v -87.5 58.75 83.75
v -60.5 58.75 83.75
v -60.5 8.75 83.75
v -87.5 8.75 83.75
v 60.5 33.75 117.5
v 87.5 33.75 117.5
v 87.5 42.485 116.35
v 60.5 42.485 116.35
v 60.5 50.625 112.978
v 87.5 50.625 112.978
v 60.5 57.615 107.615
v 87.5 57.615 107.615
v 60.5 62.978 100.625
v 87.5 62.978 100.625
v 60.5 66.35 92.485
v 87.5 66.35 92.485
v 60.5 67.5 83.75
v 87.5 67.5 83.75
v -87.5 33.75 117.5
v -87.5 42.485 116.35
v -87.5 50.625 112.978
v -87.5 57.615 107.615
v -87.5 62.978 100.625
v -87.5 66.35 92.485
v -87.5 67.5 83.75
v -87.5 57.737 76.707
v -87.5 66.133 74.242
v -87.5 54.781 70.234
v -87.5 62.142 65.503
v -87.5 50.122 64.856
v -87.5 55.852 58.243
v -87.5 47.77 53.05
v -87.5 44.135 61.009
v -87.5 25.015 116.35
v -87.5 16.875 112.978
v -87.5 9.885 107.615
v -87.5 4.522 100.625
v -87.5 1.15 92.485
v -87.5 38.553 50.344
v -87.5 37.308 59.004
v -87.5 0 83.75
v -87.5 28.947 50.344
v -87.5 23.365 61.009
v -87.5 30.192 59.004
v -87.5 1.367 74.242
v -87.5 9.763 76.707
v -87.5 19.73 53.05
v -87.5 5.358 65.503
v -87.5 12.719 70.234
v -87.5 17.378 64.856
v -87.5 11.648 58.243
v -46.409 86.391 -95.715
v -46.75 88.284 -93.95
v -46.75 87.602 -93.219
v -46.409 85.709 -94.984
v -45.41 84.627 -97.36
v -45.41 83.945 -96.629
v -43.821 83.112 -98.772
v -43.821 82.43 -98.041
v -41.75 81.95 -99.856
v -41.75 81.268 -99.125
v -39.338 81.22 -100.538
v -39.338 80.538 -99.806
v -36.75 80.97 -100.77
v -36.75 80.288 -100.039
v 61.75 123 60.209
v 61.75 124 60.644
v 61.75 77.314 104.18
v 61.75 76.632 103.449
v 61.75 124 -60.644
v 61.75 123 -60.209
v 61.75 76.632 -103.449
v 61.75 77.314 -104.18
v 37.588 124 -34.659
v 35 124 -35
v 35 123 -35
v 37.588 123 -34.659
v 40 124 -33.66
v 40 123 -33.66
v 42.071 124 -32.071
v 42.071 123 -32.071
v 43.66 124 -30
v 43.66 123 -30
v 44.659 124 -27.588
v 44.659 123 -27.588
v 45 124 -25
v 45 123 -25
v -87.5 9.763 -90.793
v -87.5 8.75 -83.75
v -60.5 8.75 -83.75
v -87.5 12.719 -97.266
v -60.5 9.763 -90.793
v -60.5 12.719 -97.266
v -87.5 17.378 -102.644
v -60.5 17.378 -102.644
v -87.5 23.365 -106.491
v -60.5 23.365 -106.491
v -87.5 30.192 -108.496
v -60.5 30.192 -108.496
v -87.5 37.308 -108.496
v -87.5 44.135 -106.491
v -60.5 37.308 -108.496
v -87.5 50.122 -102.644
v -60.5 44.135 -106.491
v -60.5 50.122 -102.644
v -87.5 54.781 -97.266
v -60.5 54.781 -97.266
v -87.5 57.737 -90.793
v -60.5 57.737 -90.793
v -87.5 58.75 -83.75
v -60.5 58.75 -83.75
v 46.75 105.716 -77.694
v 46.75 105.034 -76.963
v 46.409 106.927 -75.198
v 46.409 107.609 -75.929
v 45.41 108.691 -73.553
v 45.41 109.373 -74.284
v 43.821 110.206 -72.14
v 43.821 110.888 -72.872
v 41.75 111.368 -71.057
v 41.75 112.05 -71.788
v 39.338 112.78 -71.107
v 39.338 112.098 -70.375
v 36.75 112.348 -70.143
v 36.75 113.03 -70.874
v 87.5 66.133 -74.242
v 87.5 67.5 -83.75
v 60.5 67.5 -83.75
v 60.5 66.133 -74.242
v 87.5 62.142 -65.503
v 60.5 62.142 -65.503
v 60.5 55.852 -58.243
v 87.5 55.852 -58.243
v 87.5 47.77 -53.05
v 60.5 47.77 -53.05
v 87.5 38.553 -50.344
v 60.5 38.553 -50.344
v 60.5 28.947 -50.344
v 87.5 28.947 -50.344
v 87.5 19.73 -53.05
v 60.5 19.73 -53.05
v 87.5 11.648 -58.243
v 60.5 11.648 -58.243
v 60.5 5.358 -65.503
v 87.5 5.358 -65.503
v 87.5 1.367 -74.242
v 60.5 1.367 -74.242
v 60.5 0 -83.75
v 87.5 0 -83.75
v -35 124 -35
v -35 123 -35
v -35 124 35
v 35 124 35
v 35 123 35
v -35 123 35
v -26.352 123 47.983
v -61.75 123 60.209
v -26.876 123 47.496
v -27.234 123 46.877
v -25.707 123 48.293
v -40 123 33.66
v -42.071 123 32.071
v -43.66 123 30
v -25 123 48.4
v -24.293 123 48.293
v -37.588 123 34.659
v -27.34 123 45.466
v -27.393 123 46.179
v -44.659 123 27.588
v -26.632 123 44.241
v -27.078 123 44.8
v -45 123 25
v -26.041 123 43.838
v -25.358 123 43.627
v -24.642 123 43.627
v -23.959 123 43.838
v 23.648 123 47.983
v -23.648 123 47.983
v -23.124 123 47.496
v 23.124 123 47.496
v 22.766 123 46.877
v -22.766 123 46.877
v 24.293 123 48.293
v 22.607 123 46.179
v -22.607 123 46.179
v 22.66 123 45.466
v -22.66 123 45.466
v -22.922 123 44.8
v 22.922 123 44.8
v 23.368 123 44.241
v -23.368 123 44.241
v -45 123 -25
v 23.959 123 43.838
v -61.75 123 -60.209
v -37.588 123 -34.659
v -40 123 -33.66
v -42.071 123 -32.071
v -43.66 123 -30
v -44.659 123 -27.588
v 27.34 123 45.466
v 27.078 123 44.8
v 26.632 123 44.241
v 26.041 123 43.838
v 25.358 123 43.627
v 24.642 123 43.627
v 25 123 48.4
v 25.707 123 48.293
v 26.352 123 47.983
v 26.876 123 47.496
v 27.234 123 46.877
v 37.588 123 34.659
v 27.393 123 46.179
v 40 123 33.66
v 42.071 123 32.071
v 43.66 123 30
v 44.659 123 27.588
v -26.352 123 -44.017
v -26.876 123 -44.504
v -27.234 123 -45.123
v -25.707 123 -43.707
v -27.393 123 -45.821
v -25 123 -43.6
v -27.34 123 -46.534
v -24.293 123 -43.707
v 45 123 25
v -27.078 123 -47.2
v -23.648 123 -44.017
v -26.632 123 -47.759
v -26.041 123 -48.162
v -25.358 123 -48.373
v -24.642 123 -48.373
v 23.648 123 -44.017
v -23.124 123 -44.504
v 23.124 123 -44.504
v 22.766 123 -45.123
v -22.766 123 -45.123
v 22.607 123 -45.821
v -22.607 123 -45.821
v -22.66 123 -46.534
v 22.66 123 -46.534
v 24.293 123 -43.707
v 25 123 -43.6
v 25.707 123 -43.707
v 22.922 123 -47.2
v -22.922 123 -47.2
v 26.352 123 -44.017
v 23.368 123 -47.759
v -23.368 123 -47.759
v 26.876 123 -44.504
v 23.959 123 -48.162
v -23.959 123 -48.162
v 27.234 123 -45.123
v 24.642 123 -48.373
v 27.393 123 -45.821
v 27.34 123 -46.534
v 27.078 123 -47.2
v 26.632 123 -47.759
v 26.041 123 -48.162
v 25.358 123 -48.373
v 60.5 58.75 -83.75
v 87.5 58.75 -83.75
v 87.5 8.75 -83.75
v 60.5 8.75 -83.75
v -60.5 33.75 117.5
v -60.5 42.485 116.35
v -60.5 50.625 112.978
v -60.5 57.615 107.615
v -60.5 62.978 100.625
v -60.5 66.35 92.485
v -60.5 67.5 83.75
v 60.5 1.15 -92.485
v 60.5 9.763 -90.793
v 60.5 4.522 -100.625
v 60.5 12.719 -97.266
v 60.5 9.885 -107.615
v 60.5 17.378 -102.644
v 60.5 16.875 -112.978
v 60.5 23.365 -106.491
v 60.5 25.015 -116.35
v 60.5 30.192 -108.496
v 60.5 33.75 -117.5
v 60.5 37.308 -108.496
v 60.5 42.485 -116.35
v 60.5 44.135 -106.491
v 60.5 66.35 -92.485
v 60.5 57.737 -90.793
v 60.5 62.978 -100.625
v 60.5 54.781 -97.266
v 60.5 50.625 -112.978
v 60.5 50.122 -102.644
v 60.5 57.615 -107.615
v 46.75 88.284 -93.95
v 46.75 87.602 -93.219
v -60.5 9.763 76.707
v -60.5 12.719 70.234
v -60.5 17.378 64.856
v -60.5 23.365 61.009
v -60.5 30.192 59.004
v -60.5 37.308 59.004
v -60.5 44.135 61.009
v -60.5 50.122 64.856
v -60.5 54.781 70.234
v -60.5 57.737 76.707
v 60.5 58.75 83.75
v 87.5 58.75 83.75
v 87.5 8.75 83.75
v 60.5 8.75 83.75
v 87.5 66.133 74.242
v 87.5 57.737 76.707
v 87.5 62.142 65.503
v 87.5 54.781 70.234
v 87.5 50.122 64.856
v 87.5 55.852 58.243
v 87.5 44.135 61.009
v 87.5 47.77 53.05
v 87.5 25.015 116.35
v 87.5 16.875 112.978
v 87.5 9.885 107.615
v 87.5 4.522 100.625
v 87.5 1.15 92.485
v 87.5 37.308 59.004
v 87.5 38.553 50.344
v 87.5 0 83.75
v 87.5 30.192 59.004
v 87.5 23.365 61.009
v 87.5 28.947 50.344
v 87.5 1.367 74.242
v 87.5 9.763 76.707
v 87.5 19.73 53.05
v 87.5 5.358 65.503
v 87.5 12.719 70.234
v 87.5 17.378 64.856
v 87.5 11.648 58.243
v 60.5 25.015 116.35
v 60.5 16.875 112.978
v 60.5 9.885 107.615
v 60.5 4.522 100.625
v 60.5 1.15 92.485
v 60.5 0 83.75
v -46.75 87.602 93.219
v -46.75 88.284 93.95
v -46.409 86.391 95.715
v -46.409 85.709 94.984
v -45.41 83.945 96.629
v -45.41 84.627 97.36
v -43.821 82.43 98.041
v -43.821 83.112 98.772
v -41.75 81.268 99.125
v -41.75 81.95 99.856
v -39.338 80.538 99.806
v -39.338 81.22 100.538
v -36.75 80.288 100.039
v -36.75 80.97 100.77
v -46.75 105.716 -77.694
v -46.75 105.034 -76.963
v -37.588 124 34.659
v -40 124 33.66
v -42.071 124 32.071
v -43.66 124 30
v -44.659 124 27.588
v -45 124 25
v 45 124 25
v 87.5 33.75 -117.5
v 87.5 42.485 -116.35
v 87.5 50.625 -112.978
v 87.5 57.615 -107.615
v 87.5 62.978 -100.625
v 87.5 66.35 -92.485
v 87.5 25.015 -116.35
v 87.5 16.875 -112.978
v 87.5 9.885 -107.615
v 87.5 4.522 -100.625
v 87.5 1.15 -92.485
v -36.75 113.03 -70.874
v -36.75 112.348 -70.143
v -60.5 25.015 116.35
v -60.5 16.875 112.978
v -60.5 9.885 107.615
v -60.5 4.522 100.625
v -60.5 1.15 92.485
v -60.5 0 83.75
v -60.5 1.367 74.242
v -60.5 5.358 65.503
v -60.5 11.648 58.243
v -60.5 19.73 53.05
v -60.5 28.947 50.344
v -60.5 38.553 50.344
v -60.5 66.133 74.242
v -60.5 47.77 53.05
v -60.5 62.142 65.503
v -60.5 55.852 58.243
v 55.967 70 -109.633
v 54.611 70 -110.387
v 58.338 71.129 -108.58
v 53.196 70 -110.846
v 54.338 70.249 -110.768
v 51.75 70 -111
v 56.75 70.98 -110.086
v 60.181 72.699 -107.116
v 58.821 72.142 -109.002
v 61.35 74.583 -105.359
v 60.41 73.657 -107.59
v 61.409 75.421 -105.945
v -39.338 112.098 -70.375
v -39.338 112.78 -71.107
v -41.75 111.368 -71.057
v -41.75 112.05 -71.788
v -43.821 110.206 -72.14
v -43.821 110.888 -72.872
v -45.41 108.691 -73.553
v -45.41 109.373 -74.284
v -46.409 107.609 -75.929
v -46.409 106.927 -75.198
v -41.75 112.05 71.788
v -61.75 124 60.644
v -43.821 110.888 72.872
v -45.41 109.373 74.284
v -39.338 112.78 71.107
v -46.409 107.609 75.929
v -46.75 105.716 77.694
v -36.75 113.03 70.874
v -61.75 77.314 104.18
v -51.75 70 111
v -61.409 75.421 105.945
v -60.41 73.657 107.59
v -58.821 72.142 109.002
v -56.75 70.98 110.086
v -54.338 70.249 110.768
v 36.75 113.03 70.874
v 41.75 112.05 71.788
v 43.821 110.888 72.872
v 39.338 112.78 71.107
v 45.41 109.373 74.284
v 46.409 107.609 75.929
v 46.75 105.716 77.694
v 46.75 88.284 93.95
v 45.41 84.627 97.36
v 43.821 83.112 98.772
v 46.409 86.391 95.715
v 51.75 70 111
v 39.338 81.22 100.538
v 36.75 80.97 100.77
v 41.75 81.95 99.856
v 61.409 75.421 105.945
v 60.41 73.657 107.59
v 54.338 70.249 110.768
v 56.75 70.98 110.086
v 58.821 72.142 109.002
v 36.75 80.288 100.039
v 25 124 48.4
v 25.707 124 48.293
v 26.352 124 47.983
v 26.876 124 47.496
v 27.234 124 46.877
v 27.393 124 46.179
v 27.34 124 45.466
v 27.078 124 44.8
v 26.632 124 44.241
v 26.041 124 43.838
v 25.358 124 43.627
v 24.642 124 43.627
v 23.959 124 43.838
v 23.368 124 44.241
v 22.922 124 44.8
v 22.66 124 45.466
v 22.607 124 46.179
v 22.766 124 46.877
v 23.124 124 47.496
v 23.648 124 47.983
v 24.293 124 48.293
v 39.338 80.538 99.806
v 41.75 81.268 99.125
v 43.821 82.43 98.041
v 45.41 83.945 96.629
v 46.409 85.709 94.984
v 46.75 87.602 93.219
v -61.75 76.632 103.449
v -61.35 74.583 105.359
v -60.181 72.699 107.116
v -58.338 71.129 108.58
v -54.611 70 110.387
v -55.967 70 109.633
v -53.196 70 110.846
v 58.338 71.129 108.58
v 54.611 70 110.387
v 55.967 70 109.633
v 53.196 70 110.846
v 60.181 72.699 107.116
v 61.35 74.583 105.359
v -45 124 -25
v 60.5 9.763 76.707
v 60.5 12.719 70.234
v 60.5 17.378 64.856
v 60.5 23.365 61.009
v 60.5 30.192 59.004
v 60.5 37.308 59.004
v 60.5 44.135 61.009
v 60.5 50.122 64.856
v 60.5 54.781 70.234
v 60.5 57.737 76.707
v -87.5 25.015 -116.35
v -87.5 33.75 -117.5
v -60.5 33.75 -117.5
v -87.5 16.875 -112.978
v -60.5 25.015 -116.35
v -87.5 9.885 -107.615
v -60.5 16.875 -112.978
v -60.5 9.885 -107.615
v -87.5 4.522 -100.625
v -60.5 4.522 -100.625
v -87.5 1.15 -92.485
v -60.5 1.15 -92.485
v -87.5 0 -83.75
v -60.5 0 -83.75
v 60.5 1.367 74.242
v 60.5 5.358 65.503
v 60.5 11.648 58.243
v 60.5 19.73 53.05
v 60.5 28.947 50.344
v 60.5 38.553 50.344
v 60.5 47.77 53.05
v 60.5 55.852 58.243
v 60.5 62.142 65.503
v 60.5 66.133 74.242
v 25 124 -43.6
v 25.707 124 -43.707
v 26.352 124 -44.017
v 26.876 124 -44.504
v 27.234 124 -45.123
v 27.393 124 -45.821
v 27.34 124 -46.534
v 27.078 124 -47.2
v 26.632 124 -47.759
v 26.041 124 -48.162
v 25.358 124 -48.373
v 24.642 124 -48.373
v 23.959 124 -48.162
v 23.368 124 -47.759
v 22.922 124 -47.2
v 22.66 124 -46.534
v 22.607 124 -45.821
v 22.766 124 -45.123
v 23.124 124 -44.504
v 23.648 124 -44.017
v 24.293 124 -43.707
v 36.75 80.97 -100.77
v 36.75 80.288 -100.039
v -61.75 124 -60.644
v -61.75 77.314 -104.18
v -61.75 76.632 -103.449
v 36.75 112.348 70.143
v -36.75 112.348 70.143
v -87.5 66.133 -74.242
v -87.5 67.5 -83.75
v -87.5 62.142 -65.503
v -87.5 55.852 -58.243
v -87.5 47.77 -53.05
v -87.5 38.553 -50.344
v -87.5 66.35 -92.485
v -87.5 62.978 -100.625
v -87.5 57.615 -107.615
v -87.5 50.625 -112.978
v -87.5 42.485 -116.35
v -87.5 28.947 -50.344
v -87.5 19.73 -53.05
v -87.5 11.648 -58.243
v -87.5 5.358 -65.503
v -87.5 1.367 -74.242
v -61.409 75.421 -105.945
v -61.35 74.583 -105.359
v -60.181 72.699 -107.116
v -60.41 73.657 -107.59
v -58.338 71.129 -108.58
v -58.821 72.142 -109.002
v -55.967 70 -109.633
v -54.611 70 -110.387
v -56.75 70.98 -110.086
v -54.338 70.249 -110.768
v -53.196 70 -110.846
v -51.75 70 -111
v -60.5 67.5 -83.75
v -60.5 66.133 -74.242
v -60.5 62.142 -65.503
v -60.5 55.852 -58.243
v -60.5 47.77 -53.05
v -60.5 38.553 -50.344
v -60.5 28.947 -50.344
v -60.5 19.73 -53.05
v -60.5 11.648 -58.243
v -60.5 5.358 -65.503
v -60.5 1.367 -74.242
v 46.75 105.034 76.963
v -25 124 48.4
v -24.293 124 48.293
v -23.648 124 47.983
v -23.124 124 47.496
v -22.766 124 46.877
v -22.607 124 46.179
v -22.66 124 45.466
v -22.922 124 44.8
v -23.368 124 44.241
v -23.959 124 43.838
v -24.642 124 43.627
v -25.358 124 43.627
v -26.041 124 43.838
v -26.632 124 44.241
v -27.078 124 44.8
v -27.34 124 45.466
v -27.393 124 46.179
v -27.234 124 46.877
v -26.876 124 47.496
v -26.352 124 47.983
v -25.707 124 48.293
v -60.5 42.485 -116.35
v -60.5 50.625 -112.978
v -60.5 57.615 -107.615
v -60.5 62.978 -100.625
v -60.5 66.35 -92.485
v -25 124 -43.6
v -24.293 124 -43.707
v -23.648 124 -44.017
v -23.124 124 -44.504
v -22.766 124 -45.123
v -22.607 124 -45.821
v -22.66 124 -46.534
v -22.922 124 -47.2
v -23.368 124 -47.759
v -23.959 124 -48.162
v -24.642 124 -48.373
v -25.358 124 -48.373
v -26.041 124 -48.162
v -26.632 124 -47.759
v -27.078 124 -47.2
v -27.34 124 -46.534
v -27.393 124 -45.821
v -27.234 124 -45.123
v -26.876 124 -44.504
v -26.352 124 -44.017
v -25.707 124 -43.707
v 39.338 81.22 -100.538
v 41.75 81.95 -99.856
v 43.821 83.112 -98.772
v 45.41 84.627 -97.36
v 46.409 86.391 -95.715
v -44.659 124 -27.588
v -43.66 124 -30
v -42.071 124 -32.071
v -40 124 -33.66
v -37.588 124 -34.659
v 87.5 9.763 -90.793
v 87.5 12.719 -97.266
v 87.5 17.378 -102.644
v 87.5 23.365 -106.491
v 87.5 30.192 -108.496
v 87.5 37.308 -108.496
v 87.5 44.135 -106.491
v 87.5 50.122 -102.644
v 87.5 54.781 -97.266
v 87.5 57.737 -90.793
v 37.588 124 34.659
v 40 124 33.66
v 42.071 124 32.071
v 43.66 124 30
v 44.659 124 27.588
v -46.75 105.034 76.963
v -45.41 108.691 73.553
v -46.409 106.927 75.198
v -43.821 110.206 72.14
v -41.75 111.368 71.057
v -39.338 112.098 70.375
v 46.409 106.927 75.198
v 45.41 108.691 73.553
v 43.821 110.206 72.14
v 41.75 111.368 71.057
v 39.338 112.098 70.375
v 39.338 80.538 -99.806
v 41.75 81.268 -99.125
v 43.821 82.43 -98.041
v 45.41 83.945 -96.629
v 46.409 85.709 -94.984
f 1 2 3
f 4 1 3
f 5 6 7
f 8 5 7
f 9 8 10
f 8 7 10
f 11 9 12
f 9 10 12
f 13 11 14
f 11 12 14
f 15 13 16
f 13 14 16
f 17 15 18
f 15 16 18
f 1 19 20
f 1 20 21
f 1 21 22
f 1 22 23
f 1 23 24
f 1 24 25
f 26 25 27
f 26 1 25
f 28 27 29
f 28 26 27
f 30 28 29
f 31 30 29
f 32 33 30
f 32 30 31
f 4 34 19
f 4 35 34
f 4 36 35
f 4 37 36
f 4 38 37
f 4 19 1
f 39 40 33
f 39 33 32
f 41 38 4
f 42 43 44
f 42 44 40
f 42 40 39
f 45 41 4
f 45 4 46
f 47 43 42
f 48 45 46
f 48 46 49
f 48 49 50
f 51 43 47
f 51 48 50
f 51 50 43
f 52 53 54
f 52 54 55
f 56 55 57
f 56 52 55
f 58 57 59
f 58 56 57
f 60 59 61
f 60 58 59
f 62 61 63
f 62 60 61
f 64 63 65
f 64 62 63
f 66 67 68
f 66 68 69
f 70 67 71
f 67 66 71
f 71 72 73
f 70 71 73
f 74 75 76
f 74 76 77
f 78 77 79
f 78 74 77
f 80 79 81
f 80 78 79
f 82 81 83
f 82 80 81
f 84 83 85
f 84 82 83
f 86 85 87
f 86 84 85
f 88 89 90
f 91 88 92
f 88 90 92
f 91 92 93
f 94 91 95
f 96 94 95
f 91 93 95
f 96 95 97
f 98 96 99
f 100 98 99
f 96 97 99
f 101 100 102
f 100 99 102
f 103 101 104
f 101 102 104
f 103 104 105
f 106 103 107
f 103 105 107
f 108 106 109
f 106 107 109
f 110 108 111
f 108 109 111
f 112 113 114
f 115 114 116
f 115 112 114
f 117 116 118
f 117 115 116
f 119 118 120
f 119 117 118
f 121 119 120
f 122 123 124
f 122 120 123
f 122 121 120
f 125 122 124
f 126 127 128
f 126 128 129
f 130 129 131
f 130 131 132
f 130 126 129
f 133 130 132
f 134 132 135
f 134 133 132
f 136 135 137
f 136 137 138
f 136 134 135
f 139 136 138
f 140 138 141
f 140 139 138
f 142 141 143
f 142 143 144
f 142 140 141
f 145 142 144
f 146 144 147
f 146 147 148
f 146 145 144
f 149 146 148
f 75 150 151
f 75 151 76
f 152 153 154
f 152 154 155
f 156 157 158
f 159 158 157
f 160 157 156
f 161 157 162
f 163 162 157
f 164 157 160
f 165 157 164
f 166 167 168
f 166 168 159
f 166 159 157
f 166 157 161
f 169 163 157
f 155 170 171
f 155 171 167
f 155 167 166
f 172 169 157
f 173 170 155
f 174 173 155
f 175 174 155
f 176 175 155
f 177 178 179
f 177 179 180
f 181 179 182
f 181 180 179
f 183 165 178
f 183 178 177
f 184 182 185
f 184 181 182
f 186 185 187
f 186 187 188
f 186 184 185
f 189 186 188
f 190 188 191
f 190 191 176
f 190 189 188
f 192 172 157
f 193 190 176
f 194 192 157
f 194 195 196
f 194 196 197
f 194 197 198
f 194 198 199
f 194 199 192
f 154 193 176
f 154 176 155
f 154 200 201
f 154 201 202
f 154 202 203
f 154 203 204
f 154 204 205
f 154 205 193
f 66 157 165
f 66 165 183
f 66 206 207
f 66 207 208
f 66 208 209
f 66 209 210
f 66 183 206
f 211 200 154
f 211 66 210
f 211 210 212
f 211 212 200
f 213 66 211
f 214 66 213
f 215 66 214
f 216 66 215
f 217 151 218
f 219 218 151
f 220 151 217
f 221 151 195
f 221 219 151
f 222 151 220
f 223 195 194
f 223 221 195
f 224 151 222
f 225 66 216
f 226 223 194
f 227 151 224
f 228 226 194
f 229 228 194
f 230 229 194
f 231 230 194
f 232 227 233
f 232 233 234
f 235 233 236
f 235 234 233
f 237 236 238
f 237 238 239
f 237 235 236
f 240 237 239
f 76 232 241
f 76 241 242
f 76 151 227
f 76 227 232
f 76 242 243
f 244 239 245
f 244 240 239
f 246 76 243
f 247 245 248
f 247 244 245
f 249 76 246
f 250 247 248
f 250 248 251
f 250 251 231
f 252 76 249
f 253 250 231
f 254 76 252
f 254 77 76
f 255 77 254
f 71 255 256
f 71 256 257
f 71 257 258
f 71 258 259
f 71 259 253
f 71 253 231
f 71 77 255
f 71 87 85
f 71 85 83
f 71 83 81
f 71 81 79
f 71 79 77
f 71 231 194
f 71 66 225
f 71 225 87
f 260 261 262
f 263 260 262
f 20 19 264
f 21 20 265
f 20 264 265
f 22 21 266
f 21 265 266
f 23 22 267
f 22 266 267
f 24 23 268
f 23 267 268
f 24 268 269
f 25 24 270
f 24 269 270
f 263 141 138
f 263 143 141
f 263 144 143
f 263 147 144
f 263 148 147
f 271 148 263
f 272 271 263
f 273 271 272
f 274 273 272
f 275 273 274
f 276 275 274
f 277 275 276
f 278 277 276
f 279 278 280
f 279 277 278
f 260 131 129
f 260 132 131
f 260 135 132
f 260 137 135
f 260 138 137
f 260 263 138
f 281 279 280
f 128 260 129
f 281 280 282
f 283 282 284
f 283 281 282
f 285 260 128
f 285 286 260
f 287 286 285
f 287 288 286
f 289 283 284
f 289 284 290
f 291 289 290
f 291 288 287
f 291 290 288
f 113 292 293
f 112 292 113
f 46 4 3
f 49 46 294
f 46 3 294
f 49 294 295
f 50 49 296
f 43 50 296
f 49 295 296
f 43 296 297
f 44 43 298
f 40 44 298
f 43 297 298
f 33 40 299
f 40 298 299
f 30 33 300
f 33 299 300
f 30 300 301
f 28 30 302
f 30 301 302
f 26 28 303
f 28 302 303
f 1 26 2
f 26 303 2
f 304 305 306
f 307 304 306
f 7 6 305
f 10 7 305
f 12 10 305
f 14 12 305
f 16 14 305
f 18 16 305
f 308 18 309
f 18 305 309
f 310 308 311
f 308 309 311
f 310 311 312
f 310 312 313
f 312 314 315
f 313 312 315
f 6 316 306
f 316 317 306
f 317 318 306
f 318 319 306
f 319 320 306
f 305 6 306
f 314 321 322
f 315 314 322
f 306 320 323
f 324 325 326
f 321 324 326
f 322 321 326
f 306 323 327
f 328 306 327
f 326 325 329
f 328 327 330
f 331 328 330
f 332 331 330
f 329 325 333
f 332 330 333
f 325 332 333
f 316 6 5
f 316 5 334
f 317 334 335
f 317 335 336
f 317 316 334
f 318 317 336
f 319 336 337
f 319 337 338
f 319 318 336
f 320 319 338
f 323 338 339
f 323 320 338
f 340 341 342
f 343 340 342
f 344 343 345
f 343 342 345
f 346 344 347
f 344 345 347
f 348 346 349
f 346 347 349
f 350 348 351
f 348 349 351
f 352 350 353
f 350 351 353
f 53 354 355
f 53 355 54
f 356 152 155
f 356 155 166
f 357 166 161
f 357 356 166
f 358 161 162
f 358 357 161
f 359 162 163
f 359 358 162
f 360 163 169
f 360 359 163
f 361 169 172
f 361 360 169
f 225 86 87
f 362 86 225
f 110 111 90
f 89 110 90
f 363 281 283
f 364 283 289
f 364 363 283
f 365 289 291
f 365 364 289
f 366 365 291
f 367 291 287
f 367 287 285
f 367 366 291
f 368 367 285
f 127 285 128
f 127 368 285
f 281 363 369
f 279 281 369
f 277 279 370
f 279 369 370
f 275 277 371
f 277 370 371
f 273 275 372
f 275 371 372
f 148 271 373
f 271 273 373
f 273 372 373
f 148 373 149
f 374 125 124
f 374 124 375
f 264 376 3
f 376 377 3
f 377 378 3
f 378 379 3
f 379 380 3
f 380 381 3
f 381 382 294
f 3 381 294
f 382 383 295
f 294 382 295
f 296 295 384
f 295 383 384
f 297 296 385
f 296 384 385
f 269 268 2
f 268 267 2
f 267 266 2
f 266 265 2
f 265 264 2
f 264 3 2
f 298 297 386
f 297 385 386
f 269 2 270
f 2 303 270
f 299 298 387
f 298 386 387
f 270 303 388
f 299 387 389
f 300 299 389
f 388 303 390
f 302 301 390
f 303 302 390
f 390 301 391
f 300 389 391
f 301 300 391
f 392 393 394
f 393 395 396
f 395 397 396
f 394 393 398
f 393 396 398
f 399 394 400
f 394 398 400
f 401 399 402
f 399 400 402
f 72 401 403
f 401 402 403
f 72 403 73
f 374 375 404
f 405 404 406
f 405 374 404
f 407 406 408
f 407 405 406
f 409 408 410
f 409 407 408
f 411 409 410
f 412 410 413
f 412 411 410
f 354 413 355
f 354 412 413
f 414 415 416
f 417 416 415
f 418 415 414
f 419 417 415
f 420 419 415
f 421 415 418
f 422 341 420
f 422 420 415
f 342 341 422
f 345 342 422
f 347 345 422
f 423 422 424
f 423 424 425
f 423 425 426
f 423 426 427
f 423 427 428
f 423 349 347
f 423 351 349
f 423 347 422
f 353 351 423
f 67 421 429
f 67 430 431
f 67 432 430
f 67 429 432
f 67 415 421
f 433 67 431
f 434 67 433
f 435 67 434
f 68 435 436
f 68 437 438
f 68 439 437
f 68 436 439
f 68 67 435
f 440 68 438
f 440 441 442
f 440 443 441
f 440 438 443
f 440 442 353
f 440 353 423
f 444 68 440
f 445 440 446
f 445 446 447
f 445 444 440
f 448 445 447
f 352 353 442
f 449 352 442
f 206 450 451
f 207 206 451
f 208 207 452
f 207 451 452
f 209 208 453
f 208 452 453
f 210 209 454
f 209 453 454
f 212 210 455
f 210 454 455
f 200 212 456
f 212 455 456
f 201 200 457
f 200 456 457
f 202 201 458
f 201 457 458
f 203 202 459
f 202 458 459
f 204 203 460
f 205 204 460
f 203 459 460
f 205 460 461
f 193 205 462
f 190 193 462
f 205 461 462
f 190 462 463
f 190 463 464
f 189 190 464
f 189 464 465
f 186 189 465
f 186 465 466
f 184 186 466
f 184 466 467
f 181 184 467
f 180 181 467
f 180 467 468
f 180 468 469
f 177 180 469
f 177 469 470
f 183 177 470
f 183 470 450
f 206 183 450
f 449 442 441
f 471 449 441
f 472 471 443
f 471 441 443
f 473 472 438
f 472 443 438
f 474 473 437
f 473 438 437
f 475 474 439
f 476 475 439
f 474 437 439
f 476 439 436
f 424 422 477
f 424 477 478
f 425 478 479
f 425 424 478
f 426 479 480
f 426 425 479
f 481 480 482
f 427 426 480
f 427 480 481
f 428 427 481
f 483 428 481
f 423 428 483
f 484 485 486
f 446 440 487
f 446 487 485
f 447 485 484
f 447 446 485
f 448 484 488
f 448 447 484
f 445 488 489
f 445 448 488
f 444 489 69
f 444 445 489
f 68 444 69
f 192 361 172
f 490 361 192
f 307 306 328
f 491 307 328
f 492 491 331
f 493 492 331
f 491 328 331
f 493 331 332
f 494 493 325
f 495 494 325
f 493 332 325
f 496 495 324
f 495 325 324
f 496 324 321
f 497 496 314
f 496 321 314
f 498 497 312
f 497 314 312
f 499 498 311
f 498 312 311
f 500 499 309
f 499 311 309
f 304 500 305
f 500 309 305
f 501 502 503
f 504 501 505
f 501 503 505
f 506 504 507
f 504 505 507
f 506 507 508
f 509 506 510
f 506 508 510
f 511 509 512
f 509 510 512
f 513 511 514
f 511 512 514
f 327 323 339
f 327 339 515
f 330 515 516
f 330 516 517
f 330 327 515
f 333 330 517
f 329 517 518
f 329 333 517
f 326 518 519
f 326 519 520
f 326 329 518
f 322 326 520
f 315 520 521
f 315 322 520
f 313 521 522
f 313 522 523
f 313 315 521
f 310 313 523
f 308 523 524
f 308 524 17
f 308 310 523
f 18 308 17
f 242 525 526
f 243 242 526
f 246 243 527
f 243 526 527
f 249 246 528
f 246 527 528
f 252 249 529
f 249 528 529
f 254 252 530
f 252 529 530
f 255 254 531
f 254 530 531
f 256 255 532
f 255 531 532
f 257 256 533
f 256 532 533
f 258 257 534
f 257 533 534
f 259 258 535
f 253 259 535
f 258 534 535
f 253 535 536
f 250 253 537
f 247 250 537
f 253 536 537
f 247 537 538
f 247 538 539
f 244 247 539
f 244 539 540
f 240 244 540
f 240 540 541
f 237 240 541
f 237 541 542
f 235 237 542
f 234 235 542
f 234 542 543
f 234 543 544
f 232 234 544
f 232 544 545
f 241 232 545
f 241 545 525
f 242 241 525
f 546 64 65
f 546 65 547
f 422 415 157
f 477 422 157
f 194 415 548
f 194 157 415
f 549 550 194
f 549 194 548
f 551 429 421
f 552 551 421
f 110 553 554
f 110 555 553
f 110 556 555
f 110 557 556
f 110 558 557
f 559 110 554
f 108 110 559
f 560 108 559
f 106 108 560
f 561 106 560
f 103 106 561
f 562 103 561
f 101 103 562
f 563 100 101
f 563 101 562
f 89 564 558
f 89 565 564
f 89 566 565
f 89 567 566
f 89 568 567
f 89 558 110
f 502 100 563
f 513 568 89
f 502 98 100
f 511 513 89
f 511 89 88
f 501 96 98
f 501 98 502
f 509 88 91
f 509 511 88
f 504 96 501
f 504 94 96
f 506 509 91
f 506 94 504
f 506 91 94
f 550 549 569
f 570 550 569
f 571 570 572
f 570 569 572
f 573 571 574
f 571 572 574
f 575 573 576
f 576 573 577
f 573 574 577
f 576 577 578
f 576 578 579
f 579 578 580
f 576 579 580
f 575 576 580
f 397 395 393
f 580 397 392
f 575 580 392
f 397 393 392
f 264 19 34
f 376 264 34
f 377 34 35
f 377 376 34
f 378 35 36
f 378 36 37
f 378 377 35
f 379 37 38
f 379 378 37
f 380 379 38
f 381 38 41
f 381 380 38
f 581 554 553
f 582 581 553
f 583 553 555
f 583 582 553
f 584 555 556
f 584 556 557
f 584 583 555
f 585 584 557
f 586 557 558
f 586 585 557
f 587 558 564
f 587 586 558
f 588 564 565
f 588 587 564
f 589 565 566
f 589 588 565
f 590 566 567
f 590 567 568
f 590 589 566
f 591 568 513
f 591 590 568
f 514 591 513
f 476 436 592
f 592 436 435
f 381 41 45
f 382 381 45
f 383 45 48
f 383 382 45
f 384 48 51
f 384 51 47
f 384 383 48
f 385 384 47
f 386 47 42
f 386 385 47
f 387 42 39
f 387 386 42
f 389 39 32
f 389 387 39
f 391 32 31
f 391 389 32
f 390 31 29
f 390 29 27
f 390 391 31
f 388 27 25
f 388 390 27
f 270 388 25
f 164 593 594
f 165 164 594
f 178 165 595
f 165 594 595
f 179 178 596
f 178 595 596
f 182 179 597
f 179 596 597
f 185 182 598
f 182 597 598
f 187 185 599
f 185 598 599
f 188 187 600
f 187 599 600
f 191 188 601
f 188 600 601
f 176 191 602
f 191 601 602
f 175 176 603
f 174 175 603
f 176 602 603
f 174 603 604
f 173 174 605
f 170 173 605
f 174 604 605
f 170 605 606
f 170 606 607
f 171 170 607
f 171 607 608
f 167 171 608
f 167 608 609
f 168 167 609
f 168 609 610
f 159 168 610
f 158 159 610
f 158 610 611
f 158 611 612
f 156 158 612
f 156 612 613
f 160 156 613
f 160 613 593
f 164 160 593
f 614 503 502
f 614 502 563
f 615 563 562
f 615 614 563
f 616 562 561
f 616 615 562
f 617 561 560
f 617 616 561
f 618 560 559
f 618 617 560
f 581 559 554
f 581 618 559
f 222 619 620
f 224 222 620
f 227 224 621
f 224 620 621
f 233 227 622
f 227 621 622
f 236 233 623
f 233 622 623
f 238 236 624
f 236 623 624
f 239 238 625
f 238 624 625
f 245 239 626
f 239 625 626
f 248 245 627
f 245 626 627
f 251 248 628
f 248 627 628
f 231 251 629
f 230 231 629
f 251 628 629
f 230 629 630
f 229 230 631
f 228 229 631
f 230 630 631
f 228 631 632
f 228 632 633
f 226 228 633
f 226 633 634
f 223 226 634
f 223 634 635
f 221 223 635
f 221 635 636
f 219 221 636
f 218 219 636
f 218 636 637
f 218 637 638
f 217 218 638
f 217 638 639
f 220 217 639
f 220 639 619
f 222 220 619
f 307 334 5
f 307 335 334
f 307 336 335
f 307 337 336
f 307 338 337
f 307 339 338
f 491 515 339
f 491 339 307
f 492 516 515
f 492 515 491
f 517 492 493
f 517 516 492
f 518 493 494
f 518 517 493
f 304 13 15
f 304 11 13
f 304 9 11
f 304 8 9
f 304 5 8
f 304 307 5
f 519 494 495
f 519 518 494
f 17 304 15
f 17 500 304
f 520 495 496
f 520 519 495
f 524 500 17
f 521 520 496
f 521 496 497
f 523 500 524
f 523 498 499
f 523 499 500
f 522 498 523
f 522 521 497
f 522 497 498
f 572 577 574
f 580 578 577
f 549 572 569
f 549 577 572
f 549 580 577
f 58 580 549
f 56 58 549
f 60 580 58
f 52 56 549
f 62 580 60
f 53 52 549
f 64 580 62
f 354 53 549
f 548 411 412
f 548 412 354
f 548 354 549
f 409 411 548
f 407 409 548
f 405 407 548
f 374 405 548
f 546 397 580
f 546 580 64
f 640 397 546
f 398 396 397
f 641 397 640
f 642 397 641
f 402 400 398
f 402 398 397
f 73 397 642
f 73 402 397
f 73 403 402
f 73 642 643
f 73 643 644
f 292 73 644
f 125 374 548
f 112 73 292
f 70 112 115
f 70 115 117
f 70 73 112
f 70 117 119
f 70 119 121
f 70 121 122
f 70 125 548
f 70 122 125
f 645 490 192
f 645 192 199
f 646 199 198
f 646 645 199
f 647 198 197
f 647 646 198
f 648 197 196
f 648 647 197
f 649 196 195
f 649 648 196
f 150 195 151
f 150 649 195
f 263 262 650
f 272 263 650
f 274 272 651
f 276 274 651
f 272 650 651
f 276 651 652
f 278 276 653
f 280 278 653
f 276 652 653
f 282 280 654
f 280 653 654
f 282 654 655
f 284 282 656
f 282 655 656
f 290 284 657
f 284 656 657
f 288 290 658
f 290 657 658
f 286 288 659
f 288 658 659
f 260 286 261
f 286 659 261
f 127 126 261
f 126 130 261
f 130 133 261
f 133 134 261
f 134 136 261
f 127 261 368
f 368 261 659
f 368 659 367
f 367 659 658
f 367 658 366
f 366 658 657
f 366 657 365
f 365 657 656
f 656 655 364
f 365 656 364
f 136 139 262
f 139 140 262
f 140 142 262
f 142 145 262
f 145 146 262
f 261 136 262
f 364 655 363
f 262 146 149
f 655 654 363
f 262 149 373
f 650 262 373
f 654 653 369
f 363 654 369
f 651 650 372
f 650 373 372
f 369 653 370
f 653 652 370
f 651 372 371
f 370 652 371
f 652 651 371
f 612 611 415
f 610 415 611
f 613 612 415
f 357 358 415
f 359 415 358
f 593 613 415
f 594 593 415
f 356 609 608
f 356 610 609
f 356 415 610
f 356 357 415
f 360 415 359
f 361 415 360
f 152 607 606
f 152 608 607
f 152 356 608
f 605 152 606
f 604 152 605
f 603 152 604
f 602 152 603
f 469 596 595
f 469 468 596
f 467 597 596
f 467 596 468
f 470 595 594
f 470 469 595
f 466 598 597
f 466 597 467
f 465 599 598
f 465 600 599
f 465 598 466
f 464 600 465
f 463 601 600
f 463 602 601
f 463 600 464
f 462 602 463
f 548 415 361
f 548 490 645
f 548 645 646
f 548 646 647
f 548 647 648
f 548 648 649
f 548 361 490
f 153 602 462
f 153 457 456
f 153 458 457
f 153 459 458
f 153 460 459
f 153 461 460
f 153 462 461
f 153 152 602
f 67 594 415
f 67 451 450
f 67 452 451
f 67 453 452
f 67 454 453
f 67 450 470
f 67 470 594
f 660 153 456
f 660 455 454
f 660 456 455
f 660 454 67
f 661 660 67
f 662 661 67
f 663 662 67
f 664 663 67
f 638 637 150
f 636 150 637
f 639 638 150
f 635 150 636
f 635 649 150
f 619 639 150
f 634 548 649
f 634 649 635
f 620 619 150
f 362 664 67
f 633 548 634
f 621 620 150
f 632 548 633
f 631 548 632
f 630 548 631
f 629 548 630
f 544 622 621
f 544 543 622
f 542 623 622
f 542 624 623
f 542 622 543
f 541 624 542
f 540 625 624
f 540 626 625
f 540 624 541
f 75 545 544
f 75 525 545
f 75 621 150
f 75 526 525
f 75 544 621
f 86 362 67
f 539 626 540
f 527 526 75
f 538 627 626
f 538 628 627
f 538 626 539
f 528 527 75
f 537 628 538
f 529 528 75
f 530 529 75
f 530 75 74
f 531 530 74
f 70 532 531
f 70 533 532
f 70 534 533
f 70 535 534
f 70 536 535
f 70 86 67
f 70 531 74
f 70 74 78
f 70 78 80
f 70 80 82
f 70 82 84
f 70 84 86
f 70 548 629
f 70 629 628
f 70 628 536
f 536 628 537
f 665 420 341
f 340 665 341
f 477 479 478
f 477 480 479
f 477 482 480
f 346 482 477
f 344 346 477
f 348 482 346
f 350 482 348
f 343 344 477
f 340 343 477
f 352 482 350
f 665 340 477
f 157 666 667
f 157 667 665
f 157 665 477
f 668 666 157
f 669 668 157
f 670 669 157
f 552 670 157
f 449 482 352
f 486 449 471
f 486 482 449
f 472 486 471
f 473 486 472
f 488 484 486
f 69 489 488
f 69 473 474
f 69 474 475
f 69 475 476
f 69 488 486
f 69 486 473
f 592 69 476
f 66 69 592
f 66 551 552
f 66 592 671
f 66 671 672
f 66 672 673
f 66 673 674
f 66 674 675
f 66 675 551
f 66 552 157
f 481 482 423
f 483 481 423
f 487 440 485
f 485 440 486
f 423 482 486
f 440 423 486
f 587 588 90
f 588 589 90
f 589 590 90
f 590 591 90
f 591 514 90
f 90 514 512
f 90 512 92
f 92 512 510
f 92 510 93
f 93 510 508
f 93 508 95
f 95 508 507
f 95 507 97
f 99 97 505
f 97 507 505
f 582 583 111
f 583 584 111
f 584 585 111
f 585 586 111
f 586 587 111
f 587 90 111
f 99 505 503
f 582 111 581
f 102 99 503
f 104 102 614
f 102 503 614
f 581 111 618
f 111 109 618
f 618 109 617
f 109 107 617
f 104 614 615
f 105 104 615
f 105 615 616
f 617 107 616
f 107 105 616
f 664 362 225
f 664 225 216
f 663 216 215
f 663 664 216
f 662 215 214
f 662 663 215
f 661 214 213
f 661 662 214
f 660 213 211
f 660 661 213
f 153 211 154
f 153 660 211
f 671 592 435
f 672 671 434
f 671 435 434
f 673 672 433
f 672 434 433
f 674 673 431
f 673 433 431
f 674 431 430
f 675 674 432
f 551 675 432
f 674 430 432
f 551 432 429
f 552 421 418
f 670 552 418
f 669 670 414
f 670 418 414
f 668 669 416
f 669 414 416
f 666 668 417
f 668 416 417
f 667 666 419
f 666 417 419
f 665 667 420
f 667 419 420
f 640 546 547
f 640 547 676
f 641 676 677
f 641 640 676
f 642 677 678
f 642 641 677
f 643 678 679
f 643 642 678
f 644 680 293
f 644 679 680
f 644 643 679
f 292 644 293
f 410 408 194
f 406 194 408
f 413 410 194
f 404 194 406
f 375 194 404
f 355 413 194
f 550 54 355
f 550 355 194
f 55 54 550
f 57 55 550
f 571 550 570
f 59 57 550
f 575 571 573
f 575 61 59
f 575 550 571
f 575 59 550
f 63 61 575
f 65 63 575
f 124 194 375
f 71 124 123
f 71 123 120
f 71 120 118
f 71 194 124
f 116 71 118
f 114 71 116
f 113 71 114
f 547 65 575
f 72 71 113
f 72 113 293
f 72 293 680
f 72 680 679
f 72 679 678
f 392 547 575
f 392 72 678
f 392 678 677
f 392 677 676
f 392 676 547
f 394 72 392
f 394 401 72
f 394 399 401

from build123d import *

# Parameters (mm, degrees)
ESBO_O1_W                  = 175
ESBO_O1_H                  = 235
RESSALTO_EXTRUS_O1_DEPTH   = 67.5
FILETE1_R                  = 33.75
CORTE_EXTRUS_O1_DEPTH      = 222.331199789
CORTE_EXTRUS_O2_DEPTH      = 162.303285769
CORTE_EXTRUS_O2_DEPTH_BACK = 162.303285769
ESBO_O3_W                  = 121
ESBO_O3_H                  = 67.5
ESBO_O4_W                  = 123.5
ESBO_O4_H                  = 222
RESSALTO_EXTRUS_O2_DEPTH   = 54
CORTE_EXTRUS_O3_DEPTH      = 227.843145147
ESBO_O7_R                  = 2.4
CORTE_EXTRUS_O4_DEPTH      = 192.933582262
CORTE_EXTRUS_O5_DEPTH      = 10
CORTE_EXTRUS_O6_DEPTH      = 245.555208491


with BuildPart() as part:
    # Esboço1 → Ressalto-extrusão1 (new body)
    with BuildSketch(Plane(origin=(0, 0, 0), x_dir=(1, 0, 0), z_dir=(0, 1, 0))):
        Rectangle(ESBO_O1_W, ESBO_O1_H)
    extrude(amount=RESSALTO_EXTRUS_O1_DEPTH)

    # Filete1
    filete1_edges = [part.edges().sort_by_distance(p)[0] for p in [
        (0, 0, -117.5),
        (0, 67.5, -117.5),
        (0, 0, 117.5),
        (0, 67.5, 117.5),
    ]]
    fillet(filete1_edges, radius=FILETE1_R - 0.0001)  # a hair under: the kernel refuses the full size

    # Esboço2 → Corte-extrusão1 (cut, through all)
    with BuildSketch(Plane(origin=(87.5, 0, 0), x_dir=(0, 0, -1), z_dir=(1, 0, 0))):
        with BuildLine():
            Line((-83.75, 67.5), (83.75, 67.5))
            ThreePointArc((83.75, 67.5), (50, 33.75), (83.75, 0))
            Line((83.75, 0), (-83.75, 0))
            ThreePointArc((-83.75, 0), (-50, 33.75), (-83.75, 67.5))
        make_face()
    extrude(amount=-CORTE_EXTRUS_O1_DEPTH, mode=Mode.SUBTRACT)


with BuildPart() as corte_extrus_o1_piece_1:
    # of the separate pieces the step leaves, piece 1, a body of its own (corte_extrus_o1_pieces)
    add(part.part.solids().sort_by_distance((-87.5, 33.7499, -117.5))[0])


with BuildPart() as corte_extrus_o1_piece_2:
    # of the separate pieces the step leaves, piece 2, a body of its own (corte_extrus_o1_pieces)
    add(part.part.solids().sort_by_distance((-87.5, 33.7499, 117.5))[0])


with BuildPart() as corte_extrus_o2_tool:
    # Esboço3 → Corte-extrusão2 (new, two sides: drawn at the far end of the back side and taken through both)
    with BuildSketch(Plane.XY.offset(-CORTE_EXTRUS_O2_DEPTH_BACK)):
        with Locations((0, 33.75)):
            Rectangle(ESBO_O3_W, ESBO_O3_H)
    extrude(amount=CORTE_EXTRUS_O2_DEPTH + CORTE_EXTRUS_O2_DEPTH_BACK)


with BuildPart() as corte_extrus_o1_piece_1_1:
    add(corte_extrus_o1_piece_1.part)

    # Corte-extrusão2: cut by corte_extrus_o2_tool
    add(corte_extrus_o2_tool.part, mode=Mode.SUBTRACT)


with BuildPart() as corte_extrus_o1_piece_2_1:
    add(corte_extrus_o1_piece_2.part)

    # Corte-extrusão2: cut by corte_extrus_o2_tool
    add(corte_extrus_o2_tool.part, mode=Mode.SUBTRACT)


with BuildPart() as corte_extrus_o2_piece_1:
    # of the separate pieces the step leaves, piece 1, a body of its own (corte_extrus_o2_pieces)
    add(corte_extrus_o1_piece_1_1.part.solids().sort_by_distance((-87.5, 33.7499, -117.5))[0])


with BuildPart() as corte_extrus_o2_piece_2:
    # of the separate pieces the step leaves, piece 2, a body of its own (corte_extrus_o2_pieces)
    add(corte_extrus_o1_piece_1_1.part.solids().sort_by_distance((60.5, 33.7499, -117.5))[0])


with BuildPart() as corte_extrus_o2_piece_1_of_corte_extrus:
    # of the separate pieces the step leaves, piece 1, a body of its own (corte_extrus_o2_pieces_of_corte_extrus_o)
    add(corte_extrus_o1_piece_2_1.part.solids().sort_by_distance((87.5, 33.7499, 117.5))[0])


with BuildPart() as corte_extrus_o2_piece_2_of_corte_extrus:
    # of the separate pieces the step leaves, piece 2, a body of its own (corte_extrus_o2_pieces_of_corte_extrus_o)
    add(corte_extrus_o1_piece_2_1.part.solids().sort_by_distance((-87.5, 33.7499, 117.5))[0])


with BuildPart() as body_5:
    # Esboço4 → Ressalto-extrusão2 (new body)
    with BuildSketch(Plane(origin=(0, 70, 0), x_dir=(1, 0, 0), z_dir=(0, 1, 0))):
        Rectangle(ESBO_O4_W, ESBO_O4_H)
    extrude(amount=RESSALTO_EXTRUS_O2_DEPTH)

    # Esboço6 → Corte-extrusão3 (cut, through all)
    with BuildSketch(Plane(origin=(61.75, 0, 0), x_dir=(0, 0, -1), z_dir=(1, 0, 0))):
        Polygon((-111, 70), (-111, 124), (-60.644185349, 124), align=None)
        Polygon((111, 124), (111, 70), (60.644185349, 124), align=None)
        Polygon((-109.632672539, 70), (-60.209372974, 123), (60.209372974, 123), (109.632672539, 70), align=None)
    extrude(amount=-CORTE_EXTRUS_O3_DEPTH, mode=Mode.SUBTRACT)

    # Esboço7 → Corte-extrusão4 (cut, through all)
    with BuildSketch(Plane(origin=(0, 124, 0), x_dir=(1, 0, 0), z_dir=(0, 1, 0))):
        with Locations(Location((-25, -46, 0), (0, 0, 270))):
            Circle(ESBO_O7_R)
        with Locations(Location((25, -46, 0), (0, 0, 270))):
            Circle(ESBO_O7_R)
        with Locations(Location((-25, 46, 0), (0, 0, 270))):
            Circle(ESBO_O7_R)
        with Locations(Location((25, 46, 0), (0, 0, 270))):
            Circle(ESBO_O7_R)
        with BuildLine():
            Line((-35, 35), (35, 35))
            ThreePointArc((35, 35), (42.071067812, 32.071067812), (45, 25))
            Line((45, 25), (45, -25))
            ThreePointArc((45, -25), (42.071067812, -32.071067812), (35, -35))
            Line((35, -35), (-35, -35))
            ThreePointArc((-35, -35), (-42.071067812, -32.071067812), (-45, -25))
            Line((-45, -25), (-45, 25))
            ThreePointArc((-45, 25), (-42.071067812, 32.071067812), (-35, 35))
        make_face()
    extrude(amount=-CORTE_EXTRUS_O4_DEPTH, mode=Mode.SUBTRACT)

    # Esboço8 → Corte-extrusão5 (cut)
    with BuildSketch(Plane(origin=(0, 87.923328208, -94.286226052), x_dir=(-1, 0, 0), z_dir=(0, 0.6819983600624947, -0.731353701619174))):
        with BuildLine():
            Line((-36.75, 34.328624046), (36.75, 34.328624046))
            ThreePointArc((36.75, 34.328624046), (43.821067812, 31.399691858), (46.75, 24.328624046))
            Line((46.75, 24.328624046), (46.75, 0.492941146))
            ThreePointArc((46.75, 0.492941146), (43.821067812, -6.578126665), (36.75, -9.507058854))
            Line((36.75, -9.507058854), (-36.75, -9.507058854))
            ThreePointArc((-36.75, -9.507058854), (-43.821067812, -6.578126665), (-46.75, 0.492941146))
            Line((-46.75, 0.492941146), (-46.75, 24.328624046))
            ThreePointArc((-46.75, 24.328624046), (-43.821067812, 31.399691858), (-36.75, 34.328624046))
        make_face()
        with BuildLine():
            Line((-61.75, -24.507058854), (-51.75, -24.507058854))
            ThreePointArc((-51.75, -24.507058854), (-58.821067812, -21.578126665), (-61.75, -14.507058854))
            Line((-61.75, -14.507058854), (-61.75, -24.507058854))
        make_face()
        with BuildLine():
            ThreePointArc((61.75, -14.507058854), (58.821067812, -21.578126665), (51.75, -24.507058854))
            Line((51.75, -24.507058854), (61.75, -24.507058854))
            Line((61.75, -24.507058854), (61.75, -14.507058854))
        make_face()
    corte_extrus_o5 = extrude(amount=-CORTE_EXTRUS_O5_DEPTH, mode=Mode.SUBTRACT)

    # Espelhar1: Corte-extrusão5 across plane
    add(corte_extrus_o5.mirror(Plane.XY), mode=Mode.SUBTRACT)


with BuildPart() as corte_extrus_o6_tool:
    # Esboço9 → Corte-extrusão6 (new, through all)
    with BuildSketch(Plane(origin=(87.5, 0, 0), x_dir=(0, 0, -1), z_dir=(1, 0, 0))):
        with BuildLine():
            Line((-83.75, 58.75), (-83.75, 8.75))
            ThreePointArc((-83.75, 8.75), (-58.75, 33.75), (-83.75, 58.75))
        make_face()
        with BuildLine():
            Line((83.75, 58.75), (83.75, 8.75))
            ThreePointArc((83.75, 8.75), (108.75, 33.75), (83.75, 58.75))
        make_face()
    extrude(amount=-CORTE_EXTRUS_O6_DEPTH)


with BuildPart() as corte_extrus_o2_piece_1_1:
    add(corte_extrus_o2_piece_1.part)

    # Corte-extrusão6: cut by corte_extrus_o6_tool
    add(corte_extrus_o6_tool.part, mode=Mode.SUBTRACT)


with BuildPart() as corte_extrus_o2_piece_2_1:
    add(corte_extrus_o2_piece_2.part)

    # Corte-extrusão6: cut by corte_extrus_o6_tool
    add(corte_extrus_o6_tool.part, mode=Mode.SUBTRACT)


with BuildPart() as corte_extrus_o2_piece_1_of_corte_extrus_1:
    add(corte_extrus_o2_piece_1_of_corte_extrus.part)

    # Corte-extrusão6: cut by corte_extrus_o6_tool
    add(corte_extrus_o6_tool.part, mode=Mode.SUBTRACT)


with BuildPart() as corte_extrus_o2_piece_2_of_corte_extrus_1:
    add(corte_extrus_o2_piece_2_of_corte_extrus.part)

    # Corte-extrusão6: cut by corte_extrus_o6_tool
    add(corte_extrus_o6_tool.part, mode=Mode.SUBTRACT)


solid = Compound([body_5.part, corte_extrus_o2_piece_1_1.part, corte_extrus_o2_piece_2_1.part, corte_extrus_o2_piece_1_of_corte_extrus_1.part, corte_extrus_o2_piece_2_of_corte_extrus_1.part])
